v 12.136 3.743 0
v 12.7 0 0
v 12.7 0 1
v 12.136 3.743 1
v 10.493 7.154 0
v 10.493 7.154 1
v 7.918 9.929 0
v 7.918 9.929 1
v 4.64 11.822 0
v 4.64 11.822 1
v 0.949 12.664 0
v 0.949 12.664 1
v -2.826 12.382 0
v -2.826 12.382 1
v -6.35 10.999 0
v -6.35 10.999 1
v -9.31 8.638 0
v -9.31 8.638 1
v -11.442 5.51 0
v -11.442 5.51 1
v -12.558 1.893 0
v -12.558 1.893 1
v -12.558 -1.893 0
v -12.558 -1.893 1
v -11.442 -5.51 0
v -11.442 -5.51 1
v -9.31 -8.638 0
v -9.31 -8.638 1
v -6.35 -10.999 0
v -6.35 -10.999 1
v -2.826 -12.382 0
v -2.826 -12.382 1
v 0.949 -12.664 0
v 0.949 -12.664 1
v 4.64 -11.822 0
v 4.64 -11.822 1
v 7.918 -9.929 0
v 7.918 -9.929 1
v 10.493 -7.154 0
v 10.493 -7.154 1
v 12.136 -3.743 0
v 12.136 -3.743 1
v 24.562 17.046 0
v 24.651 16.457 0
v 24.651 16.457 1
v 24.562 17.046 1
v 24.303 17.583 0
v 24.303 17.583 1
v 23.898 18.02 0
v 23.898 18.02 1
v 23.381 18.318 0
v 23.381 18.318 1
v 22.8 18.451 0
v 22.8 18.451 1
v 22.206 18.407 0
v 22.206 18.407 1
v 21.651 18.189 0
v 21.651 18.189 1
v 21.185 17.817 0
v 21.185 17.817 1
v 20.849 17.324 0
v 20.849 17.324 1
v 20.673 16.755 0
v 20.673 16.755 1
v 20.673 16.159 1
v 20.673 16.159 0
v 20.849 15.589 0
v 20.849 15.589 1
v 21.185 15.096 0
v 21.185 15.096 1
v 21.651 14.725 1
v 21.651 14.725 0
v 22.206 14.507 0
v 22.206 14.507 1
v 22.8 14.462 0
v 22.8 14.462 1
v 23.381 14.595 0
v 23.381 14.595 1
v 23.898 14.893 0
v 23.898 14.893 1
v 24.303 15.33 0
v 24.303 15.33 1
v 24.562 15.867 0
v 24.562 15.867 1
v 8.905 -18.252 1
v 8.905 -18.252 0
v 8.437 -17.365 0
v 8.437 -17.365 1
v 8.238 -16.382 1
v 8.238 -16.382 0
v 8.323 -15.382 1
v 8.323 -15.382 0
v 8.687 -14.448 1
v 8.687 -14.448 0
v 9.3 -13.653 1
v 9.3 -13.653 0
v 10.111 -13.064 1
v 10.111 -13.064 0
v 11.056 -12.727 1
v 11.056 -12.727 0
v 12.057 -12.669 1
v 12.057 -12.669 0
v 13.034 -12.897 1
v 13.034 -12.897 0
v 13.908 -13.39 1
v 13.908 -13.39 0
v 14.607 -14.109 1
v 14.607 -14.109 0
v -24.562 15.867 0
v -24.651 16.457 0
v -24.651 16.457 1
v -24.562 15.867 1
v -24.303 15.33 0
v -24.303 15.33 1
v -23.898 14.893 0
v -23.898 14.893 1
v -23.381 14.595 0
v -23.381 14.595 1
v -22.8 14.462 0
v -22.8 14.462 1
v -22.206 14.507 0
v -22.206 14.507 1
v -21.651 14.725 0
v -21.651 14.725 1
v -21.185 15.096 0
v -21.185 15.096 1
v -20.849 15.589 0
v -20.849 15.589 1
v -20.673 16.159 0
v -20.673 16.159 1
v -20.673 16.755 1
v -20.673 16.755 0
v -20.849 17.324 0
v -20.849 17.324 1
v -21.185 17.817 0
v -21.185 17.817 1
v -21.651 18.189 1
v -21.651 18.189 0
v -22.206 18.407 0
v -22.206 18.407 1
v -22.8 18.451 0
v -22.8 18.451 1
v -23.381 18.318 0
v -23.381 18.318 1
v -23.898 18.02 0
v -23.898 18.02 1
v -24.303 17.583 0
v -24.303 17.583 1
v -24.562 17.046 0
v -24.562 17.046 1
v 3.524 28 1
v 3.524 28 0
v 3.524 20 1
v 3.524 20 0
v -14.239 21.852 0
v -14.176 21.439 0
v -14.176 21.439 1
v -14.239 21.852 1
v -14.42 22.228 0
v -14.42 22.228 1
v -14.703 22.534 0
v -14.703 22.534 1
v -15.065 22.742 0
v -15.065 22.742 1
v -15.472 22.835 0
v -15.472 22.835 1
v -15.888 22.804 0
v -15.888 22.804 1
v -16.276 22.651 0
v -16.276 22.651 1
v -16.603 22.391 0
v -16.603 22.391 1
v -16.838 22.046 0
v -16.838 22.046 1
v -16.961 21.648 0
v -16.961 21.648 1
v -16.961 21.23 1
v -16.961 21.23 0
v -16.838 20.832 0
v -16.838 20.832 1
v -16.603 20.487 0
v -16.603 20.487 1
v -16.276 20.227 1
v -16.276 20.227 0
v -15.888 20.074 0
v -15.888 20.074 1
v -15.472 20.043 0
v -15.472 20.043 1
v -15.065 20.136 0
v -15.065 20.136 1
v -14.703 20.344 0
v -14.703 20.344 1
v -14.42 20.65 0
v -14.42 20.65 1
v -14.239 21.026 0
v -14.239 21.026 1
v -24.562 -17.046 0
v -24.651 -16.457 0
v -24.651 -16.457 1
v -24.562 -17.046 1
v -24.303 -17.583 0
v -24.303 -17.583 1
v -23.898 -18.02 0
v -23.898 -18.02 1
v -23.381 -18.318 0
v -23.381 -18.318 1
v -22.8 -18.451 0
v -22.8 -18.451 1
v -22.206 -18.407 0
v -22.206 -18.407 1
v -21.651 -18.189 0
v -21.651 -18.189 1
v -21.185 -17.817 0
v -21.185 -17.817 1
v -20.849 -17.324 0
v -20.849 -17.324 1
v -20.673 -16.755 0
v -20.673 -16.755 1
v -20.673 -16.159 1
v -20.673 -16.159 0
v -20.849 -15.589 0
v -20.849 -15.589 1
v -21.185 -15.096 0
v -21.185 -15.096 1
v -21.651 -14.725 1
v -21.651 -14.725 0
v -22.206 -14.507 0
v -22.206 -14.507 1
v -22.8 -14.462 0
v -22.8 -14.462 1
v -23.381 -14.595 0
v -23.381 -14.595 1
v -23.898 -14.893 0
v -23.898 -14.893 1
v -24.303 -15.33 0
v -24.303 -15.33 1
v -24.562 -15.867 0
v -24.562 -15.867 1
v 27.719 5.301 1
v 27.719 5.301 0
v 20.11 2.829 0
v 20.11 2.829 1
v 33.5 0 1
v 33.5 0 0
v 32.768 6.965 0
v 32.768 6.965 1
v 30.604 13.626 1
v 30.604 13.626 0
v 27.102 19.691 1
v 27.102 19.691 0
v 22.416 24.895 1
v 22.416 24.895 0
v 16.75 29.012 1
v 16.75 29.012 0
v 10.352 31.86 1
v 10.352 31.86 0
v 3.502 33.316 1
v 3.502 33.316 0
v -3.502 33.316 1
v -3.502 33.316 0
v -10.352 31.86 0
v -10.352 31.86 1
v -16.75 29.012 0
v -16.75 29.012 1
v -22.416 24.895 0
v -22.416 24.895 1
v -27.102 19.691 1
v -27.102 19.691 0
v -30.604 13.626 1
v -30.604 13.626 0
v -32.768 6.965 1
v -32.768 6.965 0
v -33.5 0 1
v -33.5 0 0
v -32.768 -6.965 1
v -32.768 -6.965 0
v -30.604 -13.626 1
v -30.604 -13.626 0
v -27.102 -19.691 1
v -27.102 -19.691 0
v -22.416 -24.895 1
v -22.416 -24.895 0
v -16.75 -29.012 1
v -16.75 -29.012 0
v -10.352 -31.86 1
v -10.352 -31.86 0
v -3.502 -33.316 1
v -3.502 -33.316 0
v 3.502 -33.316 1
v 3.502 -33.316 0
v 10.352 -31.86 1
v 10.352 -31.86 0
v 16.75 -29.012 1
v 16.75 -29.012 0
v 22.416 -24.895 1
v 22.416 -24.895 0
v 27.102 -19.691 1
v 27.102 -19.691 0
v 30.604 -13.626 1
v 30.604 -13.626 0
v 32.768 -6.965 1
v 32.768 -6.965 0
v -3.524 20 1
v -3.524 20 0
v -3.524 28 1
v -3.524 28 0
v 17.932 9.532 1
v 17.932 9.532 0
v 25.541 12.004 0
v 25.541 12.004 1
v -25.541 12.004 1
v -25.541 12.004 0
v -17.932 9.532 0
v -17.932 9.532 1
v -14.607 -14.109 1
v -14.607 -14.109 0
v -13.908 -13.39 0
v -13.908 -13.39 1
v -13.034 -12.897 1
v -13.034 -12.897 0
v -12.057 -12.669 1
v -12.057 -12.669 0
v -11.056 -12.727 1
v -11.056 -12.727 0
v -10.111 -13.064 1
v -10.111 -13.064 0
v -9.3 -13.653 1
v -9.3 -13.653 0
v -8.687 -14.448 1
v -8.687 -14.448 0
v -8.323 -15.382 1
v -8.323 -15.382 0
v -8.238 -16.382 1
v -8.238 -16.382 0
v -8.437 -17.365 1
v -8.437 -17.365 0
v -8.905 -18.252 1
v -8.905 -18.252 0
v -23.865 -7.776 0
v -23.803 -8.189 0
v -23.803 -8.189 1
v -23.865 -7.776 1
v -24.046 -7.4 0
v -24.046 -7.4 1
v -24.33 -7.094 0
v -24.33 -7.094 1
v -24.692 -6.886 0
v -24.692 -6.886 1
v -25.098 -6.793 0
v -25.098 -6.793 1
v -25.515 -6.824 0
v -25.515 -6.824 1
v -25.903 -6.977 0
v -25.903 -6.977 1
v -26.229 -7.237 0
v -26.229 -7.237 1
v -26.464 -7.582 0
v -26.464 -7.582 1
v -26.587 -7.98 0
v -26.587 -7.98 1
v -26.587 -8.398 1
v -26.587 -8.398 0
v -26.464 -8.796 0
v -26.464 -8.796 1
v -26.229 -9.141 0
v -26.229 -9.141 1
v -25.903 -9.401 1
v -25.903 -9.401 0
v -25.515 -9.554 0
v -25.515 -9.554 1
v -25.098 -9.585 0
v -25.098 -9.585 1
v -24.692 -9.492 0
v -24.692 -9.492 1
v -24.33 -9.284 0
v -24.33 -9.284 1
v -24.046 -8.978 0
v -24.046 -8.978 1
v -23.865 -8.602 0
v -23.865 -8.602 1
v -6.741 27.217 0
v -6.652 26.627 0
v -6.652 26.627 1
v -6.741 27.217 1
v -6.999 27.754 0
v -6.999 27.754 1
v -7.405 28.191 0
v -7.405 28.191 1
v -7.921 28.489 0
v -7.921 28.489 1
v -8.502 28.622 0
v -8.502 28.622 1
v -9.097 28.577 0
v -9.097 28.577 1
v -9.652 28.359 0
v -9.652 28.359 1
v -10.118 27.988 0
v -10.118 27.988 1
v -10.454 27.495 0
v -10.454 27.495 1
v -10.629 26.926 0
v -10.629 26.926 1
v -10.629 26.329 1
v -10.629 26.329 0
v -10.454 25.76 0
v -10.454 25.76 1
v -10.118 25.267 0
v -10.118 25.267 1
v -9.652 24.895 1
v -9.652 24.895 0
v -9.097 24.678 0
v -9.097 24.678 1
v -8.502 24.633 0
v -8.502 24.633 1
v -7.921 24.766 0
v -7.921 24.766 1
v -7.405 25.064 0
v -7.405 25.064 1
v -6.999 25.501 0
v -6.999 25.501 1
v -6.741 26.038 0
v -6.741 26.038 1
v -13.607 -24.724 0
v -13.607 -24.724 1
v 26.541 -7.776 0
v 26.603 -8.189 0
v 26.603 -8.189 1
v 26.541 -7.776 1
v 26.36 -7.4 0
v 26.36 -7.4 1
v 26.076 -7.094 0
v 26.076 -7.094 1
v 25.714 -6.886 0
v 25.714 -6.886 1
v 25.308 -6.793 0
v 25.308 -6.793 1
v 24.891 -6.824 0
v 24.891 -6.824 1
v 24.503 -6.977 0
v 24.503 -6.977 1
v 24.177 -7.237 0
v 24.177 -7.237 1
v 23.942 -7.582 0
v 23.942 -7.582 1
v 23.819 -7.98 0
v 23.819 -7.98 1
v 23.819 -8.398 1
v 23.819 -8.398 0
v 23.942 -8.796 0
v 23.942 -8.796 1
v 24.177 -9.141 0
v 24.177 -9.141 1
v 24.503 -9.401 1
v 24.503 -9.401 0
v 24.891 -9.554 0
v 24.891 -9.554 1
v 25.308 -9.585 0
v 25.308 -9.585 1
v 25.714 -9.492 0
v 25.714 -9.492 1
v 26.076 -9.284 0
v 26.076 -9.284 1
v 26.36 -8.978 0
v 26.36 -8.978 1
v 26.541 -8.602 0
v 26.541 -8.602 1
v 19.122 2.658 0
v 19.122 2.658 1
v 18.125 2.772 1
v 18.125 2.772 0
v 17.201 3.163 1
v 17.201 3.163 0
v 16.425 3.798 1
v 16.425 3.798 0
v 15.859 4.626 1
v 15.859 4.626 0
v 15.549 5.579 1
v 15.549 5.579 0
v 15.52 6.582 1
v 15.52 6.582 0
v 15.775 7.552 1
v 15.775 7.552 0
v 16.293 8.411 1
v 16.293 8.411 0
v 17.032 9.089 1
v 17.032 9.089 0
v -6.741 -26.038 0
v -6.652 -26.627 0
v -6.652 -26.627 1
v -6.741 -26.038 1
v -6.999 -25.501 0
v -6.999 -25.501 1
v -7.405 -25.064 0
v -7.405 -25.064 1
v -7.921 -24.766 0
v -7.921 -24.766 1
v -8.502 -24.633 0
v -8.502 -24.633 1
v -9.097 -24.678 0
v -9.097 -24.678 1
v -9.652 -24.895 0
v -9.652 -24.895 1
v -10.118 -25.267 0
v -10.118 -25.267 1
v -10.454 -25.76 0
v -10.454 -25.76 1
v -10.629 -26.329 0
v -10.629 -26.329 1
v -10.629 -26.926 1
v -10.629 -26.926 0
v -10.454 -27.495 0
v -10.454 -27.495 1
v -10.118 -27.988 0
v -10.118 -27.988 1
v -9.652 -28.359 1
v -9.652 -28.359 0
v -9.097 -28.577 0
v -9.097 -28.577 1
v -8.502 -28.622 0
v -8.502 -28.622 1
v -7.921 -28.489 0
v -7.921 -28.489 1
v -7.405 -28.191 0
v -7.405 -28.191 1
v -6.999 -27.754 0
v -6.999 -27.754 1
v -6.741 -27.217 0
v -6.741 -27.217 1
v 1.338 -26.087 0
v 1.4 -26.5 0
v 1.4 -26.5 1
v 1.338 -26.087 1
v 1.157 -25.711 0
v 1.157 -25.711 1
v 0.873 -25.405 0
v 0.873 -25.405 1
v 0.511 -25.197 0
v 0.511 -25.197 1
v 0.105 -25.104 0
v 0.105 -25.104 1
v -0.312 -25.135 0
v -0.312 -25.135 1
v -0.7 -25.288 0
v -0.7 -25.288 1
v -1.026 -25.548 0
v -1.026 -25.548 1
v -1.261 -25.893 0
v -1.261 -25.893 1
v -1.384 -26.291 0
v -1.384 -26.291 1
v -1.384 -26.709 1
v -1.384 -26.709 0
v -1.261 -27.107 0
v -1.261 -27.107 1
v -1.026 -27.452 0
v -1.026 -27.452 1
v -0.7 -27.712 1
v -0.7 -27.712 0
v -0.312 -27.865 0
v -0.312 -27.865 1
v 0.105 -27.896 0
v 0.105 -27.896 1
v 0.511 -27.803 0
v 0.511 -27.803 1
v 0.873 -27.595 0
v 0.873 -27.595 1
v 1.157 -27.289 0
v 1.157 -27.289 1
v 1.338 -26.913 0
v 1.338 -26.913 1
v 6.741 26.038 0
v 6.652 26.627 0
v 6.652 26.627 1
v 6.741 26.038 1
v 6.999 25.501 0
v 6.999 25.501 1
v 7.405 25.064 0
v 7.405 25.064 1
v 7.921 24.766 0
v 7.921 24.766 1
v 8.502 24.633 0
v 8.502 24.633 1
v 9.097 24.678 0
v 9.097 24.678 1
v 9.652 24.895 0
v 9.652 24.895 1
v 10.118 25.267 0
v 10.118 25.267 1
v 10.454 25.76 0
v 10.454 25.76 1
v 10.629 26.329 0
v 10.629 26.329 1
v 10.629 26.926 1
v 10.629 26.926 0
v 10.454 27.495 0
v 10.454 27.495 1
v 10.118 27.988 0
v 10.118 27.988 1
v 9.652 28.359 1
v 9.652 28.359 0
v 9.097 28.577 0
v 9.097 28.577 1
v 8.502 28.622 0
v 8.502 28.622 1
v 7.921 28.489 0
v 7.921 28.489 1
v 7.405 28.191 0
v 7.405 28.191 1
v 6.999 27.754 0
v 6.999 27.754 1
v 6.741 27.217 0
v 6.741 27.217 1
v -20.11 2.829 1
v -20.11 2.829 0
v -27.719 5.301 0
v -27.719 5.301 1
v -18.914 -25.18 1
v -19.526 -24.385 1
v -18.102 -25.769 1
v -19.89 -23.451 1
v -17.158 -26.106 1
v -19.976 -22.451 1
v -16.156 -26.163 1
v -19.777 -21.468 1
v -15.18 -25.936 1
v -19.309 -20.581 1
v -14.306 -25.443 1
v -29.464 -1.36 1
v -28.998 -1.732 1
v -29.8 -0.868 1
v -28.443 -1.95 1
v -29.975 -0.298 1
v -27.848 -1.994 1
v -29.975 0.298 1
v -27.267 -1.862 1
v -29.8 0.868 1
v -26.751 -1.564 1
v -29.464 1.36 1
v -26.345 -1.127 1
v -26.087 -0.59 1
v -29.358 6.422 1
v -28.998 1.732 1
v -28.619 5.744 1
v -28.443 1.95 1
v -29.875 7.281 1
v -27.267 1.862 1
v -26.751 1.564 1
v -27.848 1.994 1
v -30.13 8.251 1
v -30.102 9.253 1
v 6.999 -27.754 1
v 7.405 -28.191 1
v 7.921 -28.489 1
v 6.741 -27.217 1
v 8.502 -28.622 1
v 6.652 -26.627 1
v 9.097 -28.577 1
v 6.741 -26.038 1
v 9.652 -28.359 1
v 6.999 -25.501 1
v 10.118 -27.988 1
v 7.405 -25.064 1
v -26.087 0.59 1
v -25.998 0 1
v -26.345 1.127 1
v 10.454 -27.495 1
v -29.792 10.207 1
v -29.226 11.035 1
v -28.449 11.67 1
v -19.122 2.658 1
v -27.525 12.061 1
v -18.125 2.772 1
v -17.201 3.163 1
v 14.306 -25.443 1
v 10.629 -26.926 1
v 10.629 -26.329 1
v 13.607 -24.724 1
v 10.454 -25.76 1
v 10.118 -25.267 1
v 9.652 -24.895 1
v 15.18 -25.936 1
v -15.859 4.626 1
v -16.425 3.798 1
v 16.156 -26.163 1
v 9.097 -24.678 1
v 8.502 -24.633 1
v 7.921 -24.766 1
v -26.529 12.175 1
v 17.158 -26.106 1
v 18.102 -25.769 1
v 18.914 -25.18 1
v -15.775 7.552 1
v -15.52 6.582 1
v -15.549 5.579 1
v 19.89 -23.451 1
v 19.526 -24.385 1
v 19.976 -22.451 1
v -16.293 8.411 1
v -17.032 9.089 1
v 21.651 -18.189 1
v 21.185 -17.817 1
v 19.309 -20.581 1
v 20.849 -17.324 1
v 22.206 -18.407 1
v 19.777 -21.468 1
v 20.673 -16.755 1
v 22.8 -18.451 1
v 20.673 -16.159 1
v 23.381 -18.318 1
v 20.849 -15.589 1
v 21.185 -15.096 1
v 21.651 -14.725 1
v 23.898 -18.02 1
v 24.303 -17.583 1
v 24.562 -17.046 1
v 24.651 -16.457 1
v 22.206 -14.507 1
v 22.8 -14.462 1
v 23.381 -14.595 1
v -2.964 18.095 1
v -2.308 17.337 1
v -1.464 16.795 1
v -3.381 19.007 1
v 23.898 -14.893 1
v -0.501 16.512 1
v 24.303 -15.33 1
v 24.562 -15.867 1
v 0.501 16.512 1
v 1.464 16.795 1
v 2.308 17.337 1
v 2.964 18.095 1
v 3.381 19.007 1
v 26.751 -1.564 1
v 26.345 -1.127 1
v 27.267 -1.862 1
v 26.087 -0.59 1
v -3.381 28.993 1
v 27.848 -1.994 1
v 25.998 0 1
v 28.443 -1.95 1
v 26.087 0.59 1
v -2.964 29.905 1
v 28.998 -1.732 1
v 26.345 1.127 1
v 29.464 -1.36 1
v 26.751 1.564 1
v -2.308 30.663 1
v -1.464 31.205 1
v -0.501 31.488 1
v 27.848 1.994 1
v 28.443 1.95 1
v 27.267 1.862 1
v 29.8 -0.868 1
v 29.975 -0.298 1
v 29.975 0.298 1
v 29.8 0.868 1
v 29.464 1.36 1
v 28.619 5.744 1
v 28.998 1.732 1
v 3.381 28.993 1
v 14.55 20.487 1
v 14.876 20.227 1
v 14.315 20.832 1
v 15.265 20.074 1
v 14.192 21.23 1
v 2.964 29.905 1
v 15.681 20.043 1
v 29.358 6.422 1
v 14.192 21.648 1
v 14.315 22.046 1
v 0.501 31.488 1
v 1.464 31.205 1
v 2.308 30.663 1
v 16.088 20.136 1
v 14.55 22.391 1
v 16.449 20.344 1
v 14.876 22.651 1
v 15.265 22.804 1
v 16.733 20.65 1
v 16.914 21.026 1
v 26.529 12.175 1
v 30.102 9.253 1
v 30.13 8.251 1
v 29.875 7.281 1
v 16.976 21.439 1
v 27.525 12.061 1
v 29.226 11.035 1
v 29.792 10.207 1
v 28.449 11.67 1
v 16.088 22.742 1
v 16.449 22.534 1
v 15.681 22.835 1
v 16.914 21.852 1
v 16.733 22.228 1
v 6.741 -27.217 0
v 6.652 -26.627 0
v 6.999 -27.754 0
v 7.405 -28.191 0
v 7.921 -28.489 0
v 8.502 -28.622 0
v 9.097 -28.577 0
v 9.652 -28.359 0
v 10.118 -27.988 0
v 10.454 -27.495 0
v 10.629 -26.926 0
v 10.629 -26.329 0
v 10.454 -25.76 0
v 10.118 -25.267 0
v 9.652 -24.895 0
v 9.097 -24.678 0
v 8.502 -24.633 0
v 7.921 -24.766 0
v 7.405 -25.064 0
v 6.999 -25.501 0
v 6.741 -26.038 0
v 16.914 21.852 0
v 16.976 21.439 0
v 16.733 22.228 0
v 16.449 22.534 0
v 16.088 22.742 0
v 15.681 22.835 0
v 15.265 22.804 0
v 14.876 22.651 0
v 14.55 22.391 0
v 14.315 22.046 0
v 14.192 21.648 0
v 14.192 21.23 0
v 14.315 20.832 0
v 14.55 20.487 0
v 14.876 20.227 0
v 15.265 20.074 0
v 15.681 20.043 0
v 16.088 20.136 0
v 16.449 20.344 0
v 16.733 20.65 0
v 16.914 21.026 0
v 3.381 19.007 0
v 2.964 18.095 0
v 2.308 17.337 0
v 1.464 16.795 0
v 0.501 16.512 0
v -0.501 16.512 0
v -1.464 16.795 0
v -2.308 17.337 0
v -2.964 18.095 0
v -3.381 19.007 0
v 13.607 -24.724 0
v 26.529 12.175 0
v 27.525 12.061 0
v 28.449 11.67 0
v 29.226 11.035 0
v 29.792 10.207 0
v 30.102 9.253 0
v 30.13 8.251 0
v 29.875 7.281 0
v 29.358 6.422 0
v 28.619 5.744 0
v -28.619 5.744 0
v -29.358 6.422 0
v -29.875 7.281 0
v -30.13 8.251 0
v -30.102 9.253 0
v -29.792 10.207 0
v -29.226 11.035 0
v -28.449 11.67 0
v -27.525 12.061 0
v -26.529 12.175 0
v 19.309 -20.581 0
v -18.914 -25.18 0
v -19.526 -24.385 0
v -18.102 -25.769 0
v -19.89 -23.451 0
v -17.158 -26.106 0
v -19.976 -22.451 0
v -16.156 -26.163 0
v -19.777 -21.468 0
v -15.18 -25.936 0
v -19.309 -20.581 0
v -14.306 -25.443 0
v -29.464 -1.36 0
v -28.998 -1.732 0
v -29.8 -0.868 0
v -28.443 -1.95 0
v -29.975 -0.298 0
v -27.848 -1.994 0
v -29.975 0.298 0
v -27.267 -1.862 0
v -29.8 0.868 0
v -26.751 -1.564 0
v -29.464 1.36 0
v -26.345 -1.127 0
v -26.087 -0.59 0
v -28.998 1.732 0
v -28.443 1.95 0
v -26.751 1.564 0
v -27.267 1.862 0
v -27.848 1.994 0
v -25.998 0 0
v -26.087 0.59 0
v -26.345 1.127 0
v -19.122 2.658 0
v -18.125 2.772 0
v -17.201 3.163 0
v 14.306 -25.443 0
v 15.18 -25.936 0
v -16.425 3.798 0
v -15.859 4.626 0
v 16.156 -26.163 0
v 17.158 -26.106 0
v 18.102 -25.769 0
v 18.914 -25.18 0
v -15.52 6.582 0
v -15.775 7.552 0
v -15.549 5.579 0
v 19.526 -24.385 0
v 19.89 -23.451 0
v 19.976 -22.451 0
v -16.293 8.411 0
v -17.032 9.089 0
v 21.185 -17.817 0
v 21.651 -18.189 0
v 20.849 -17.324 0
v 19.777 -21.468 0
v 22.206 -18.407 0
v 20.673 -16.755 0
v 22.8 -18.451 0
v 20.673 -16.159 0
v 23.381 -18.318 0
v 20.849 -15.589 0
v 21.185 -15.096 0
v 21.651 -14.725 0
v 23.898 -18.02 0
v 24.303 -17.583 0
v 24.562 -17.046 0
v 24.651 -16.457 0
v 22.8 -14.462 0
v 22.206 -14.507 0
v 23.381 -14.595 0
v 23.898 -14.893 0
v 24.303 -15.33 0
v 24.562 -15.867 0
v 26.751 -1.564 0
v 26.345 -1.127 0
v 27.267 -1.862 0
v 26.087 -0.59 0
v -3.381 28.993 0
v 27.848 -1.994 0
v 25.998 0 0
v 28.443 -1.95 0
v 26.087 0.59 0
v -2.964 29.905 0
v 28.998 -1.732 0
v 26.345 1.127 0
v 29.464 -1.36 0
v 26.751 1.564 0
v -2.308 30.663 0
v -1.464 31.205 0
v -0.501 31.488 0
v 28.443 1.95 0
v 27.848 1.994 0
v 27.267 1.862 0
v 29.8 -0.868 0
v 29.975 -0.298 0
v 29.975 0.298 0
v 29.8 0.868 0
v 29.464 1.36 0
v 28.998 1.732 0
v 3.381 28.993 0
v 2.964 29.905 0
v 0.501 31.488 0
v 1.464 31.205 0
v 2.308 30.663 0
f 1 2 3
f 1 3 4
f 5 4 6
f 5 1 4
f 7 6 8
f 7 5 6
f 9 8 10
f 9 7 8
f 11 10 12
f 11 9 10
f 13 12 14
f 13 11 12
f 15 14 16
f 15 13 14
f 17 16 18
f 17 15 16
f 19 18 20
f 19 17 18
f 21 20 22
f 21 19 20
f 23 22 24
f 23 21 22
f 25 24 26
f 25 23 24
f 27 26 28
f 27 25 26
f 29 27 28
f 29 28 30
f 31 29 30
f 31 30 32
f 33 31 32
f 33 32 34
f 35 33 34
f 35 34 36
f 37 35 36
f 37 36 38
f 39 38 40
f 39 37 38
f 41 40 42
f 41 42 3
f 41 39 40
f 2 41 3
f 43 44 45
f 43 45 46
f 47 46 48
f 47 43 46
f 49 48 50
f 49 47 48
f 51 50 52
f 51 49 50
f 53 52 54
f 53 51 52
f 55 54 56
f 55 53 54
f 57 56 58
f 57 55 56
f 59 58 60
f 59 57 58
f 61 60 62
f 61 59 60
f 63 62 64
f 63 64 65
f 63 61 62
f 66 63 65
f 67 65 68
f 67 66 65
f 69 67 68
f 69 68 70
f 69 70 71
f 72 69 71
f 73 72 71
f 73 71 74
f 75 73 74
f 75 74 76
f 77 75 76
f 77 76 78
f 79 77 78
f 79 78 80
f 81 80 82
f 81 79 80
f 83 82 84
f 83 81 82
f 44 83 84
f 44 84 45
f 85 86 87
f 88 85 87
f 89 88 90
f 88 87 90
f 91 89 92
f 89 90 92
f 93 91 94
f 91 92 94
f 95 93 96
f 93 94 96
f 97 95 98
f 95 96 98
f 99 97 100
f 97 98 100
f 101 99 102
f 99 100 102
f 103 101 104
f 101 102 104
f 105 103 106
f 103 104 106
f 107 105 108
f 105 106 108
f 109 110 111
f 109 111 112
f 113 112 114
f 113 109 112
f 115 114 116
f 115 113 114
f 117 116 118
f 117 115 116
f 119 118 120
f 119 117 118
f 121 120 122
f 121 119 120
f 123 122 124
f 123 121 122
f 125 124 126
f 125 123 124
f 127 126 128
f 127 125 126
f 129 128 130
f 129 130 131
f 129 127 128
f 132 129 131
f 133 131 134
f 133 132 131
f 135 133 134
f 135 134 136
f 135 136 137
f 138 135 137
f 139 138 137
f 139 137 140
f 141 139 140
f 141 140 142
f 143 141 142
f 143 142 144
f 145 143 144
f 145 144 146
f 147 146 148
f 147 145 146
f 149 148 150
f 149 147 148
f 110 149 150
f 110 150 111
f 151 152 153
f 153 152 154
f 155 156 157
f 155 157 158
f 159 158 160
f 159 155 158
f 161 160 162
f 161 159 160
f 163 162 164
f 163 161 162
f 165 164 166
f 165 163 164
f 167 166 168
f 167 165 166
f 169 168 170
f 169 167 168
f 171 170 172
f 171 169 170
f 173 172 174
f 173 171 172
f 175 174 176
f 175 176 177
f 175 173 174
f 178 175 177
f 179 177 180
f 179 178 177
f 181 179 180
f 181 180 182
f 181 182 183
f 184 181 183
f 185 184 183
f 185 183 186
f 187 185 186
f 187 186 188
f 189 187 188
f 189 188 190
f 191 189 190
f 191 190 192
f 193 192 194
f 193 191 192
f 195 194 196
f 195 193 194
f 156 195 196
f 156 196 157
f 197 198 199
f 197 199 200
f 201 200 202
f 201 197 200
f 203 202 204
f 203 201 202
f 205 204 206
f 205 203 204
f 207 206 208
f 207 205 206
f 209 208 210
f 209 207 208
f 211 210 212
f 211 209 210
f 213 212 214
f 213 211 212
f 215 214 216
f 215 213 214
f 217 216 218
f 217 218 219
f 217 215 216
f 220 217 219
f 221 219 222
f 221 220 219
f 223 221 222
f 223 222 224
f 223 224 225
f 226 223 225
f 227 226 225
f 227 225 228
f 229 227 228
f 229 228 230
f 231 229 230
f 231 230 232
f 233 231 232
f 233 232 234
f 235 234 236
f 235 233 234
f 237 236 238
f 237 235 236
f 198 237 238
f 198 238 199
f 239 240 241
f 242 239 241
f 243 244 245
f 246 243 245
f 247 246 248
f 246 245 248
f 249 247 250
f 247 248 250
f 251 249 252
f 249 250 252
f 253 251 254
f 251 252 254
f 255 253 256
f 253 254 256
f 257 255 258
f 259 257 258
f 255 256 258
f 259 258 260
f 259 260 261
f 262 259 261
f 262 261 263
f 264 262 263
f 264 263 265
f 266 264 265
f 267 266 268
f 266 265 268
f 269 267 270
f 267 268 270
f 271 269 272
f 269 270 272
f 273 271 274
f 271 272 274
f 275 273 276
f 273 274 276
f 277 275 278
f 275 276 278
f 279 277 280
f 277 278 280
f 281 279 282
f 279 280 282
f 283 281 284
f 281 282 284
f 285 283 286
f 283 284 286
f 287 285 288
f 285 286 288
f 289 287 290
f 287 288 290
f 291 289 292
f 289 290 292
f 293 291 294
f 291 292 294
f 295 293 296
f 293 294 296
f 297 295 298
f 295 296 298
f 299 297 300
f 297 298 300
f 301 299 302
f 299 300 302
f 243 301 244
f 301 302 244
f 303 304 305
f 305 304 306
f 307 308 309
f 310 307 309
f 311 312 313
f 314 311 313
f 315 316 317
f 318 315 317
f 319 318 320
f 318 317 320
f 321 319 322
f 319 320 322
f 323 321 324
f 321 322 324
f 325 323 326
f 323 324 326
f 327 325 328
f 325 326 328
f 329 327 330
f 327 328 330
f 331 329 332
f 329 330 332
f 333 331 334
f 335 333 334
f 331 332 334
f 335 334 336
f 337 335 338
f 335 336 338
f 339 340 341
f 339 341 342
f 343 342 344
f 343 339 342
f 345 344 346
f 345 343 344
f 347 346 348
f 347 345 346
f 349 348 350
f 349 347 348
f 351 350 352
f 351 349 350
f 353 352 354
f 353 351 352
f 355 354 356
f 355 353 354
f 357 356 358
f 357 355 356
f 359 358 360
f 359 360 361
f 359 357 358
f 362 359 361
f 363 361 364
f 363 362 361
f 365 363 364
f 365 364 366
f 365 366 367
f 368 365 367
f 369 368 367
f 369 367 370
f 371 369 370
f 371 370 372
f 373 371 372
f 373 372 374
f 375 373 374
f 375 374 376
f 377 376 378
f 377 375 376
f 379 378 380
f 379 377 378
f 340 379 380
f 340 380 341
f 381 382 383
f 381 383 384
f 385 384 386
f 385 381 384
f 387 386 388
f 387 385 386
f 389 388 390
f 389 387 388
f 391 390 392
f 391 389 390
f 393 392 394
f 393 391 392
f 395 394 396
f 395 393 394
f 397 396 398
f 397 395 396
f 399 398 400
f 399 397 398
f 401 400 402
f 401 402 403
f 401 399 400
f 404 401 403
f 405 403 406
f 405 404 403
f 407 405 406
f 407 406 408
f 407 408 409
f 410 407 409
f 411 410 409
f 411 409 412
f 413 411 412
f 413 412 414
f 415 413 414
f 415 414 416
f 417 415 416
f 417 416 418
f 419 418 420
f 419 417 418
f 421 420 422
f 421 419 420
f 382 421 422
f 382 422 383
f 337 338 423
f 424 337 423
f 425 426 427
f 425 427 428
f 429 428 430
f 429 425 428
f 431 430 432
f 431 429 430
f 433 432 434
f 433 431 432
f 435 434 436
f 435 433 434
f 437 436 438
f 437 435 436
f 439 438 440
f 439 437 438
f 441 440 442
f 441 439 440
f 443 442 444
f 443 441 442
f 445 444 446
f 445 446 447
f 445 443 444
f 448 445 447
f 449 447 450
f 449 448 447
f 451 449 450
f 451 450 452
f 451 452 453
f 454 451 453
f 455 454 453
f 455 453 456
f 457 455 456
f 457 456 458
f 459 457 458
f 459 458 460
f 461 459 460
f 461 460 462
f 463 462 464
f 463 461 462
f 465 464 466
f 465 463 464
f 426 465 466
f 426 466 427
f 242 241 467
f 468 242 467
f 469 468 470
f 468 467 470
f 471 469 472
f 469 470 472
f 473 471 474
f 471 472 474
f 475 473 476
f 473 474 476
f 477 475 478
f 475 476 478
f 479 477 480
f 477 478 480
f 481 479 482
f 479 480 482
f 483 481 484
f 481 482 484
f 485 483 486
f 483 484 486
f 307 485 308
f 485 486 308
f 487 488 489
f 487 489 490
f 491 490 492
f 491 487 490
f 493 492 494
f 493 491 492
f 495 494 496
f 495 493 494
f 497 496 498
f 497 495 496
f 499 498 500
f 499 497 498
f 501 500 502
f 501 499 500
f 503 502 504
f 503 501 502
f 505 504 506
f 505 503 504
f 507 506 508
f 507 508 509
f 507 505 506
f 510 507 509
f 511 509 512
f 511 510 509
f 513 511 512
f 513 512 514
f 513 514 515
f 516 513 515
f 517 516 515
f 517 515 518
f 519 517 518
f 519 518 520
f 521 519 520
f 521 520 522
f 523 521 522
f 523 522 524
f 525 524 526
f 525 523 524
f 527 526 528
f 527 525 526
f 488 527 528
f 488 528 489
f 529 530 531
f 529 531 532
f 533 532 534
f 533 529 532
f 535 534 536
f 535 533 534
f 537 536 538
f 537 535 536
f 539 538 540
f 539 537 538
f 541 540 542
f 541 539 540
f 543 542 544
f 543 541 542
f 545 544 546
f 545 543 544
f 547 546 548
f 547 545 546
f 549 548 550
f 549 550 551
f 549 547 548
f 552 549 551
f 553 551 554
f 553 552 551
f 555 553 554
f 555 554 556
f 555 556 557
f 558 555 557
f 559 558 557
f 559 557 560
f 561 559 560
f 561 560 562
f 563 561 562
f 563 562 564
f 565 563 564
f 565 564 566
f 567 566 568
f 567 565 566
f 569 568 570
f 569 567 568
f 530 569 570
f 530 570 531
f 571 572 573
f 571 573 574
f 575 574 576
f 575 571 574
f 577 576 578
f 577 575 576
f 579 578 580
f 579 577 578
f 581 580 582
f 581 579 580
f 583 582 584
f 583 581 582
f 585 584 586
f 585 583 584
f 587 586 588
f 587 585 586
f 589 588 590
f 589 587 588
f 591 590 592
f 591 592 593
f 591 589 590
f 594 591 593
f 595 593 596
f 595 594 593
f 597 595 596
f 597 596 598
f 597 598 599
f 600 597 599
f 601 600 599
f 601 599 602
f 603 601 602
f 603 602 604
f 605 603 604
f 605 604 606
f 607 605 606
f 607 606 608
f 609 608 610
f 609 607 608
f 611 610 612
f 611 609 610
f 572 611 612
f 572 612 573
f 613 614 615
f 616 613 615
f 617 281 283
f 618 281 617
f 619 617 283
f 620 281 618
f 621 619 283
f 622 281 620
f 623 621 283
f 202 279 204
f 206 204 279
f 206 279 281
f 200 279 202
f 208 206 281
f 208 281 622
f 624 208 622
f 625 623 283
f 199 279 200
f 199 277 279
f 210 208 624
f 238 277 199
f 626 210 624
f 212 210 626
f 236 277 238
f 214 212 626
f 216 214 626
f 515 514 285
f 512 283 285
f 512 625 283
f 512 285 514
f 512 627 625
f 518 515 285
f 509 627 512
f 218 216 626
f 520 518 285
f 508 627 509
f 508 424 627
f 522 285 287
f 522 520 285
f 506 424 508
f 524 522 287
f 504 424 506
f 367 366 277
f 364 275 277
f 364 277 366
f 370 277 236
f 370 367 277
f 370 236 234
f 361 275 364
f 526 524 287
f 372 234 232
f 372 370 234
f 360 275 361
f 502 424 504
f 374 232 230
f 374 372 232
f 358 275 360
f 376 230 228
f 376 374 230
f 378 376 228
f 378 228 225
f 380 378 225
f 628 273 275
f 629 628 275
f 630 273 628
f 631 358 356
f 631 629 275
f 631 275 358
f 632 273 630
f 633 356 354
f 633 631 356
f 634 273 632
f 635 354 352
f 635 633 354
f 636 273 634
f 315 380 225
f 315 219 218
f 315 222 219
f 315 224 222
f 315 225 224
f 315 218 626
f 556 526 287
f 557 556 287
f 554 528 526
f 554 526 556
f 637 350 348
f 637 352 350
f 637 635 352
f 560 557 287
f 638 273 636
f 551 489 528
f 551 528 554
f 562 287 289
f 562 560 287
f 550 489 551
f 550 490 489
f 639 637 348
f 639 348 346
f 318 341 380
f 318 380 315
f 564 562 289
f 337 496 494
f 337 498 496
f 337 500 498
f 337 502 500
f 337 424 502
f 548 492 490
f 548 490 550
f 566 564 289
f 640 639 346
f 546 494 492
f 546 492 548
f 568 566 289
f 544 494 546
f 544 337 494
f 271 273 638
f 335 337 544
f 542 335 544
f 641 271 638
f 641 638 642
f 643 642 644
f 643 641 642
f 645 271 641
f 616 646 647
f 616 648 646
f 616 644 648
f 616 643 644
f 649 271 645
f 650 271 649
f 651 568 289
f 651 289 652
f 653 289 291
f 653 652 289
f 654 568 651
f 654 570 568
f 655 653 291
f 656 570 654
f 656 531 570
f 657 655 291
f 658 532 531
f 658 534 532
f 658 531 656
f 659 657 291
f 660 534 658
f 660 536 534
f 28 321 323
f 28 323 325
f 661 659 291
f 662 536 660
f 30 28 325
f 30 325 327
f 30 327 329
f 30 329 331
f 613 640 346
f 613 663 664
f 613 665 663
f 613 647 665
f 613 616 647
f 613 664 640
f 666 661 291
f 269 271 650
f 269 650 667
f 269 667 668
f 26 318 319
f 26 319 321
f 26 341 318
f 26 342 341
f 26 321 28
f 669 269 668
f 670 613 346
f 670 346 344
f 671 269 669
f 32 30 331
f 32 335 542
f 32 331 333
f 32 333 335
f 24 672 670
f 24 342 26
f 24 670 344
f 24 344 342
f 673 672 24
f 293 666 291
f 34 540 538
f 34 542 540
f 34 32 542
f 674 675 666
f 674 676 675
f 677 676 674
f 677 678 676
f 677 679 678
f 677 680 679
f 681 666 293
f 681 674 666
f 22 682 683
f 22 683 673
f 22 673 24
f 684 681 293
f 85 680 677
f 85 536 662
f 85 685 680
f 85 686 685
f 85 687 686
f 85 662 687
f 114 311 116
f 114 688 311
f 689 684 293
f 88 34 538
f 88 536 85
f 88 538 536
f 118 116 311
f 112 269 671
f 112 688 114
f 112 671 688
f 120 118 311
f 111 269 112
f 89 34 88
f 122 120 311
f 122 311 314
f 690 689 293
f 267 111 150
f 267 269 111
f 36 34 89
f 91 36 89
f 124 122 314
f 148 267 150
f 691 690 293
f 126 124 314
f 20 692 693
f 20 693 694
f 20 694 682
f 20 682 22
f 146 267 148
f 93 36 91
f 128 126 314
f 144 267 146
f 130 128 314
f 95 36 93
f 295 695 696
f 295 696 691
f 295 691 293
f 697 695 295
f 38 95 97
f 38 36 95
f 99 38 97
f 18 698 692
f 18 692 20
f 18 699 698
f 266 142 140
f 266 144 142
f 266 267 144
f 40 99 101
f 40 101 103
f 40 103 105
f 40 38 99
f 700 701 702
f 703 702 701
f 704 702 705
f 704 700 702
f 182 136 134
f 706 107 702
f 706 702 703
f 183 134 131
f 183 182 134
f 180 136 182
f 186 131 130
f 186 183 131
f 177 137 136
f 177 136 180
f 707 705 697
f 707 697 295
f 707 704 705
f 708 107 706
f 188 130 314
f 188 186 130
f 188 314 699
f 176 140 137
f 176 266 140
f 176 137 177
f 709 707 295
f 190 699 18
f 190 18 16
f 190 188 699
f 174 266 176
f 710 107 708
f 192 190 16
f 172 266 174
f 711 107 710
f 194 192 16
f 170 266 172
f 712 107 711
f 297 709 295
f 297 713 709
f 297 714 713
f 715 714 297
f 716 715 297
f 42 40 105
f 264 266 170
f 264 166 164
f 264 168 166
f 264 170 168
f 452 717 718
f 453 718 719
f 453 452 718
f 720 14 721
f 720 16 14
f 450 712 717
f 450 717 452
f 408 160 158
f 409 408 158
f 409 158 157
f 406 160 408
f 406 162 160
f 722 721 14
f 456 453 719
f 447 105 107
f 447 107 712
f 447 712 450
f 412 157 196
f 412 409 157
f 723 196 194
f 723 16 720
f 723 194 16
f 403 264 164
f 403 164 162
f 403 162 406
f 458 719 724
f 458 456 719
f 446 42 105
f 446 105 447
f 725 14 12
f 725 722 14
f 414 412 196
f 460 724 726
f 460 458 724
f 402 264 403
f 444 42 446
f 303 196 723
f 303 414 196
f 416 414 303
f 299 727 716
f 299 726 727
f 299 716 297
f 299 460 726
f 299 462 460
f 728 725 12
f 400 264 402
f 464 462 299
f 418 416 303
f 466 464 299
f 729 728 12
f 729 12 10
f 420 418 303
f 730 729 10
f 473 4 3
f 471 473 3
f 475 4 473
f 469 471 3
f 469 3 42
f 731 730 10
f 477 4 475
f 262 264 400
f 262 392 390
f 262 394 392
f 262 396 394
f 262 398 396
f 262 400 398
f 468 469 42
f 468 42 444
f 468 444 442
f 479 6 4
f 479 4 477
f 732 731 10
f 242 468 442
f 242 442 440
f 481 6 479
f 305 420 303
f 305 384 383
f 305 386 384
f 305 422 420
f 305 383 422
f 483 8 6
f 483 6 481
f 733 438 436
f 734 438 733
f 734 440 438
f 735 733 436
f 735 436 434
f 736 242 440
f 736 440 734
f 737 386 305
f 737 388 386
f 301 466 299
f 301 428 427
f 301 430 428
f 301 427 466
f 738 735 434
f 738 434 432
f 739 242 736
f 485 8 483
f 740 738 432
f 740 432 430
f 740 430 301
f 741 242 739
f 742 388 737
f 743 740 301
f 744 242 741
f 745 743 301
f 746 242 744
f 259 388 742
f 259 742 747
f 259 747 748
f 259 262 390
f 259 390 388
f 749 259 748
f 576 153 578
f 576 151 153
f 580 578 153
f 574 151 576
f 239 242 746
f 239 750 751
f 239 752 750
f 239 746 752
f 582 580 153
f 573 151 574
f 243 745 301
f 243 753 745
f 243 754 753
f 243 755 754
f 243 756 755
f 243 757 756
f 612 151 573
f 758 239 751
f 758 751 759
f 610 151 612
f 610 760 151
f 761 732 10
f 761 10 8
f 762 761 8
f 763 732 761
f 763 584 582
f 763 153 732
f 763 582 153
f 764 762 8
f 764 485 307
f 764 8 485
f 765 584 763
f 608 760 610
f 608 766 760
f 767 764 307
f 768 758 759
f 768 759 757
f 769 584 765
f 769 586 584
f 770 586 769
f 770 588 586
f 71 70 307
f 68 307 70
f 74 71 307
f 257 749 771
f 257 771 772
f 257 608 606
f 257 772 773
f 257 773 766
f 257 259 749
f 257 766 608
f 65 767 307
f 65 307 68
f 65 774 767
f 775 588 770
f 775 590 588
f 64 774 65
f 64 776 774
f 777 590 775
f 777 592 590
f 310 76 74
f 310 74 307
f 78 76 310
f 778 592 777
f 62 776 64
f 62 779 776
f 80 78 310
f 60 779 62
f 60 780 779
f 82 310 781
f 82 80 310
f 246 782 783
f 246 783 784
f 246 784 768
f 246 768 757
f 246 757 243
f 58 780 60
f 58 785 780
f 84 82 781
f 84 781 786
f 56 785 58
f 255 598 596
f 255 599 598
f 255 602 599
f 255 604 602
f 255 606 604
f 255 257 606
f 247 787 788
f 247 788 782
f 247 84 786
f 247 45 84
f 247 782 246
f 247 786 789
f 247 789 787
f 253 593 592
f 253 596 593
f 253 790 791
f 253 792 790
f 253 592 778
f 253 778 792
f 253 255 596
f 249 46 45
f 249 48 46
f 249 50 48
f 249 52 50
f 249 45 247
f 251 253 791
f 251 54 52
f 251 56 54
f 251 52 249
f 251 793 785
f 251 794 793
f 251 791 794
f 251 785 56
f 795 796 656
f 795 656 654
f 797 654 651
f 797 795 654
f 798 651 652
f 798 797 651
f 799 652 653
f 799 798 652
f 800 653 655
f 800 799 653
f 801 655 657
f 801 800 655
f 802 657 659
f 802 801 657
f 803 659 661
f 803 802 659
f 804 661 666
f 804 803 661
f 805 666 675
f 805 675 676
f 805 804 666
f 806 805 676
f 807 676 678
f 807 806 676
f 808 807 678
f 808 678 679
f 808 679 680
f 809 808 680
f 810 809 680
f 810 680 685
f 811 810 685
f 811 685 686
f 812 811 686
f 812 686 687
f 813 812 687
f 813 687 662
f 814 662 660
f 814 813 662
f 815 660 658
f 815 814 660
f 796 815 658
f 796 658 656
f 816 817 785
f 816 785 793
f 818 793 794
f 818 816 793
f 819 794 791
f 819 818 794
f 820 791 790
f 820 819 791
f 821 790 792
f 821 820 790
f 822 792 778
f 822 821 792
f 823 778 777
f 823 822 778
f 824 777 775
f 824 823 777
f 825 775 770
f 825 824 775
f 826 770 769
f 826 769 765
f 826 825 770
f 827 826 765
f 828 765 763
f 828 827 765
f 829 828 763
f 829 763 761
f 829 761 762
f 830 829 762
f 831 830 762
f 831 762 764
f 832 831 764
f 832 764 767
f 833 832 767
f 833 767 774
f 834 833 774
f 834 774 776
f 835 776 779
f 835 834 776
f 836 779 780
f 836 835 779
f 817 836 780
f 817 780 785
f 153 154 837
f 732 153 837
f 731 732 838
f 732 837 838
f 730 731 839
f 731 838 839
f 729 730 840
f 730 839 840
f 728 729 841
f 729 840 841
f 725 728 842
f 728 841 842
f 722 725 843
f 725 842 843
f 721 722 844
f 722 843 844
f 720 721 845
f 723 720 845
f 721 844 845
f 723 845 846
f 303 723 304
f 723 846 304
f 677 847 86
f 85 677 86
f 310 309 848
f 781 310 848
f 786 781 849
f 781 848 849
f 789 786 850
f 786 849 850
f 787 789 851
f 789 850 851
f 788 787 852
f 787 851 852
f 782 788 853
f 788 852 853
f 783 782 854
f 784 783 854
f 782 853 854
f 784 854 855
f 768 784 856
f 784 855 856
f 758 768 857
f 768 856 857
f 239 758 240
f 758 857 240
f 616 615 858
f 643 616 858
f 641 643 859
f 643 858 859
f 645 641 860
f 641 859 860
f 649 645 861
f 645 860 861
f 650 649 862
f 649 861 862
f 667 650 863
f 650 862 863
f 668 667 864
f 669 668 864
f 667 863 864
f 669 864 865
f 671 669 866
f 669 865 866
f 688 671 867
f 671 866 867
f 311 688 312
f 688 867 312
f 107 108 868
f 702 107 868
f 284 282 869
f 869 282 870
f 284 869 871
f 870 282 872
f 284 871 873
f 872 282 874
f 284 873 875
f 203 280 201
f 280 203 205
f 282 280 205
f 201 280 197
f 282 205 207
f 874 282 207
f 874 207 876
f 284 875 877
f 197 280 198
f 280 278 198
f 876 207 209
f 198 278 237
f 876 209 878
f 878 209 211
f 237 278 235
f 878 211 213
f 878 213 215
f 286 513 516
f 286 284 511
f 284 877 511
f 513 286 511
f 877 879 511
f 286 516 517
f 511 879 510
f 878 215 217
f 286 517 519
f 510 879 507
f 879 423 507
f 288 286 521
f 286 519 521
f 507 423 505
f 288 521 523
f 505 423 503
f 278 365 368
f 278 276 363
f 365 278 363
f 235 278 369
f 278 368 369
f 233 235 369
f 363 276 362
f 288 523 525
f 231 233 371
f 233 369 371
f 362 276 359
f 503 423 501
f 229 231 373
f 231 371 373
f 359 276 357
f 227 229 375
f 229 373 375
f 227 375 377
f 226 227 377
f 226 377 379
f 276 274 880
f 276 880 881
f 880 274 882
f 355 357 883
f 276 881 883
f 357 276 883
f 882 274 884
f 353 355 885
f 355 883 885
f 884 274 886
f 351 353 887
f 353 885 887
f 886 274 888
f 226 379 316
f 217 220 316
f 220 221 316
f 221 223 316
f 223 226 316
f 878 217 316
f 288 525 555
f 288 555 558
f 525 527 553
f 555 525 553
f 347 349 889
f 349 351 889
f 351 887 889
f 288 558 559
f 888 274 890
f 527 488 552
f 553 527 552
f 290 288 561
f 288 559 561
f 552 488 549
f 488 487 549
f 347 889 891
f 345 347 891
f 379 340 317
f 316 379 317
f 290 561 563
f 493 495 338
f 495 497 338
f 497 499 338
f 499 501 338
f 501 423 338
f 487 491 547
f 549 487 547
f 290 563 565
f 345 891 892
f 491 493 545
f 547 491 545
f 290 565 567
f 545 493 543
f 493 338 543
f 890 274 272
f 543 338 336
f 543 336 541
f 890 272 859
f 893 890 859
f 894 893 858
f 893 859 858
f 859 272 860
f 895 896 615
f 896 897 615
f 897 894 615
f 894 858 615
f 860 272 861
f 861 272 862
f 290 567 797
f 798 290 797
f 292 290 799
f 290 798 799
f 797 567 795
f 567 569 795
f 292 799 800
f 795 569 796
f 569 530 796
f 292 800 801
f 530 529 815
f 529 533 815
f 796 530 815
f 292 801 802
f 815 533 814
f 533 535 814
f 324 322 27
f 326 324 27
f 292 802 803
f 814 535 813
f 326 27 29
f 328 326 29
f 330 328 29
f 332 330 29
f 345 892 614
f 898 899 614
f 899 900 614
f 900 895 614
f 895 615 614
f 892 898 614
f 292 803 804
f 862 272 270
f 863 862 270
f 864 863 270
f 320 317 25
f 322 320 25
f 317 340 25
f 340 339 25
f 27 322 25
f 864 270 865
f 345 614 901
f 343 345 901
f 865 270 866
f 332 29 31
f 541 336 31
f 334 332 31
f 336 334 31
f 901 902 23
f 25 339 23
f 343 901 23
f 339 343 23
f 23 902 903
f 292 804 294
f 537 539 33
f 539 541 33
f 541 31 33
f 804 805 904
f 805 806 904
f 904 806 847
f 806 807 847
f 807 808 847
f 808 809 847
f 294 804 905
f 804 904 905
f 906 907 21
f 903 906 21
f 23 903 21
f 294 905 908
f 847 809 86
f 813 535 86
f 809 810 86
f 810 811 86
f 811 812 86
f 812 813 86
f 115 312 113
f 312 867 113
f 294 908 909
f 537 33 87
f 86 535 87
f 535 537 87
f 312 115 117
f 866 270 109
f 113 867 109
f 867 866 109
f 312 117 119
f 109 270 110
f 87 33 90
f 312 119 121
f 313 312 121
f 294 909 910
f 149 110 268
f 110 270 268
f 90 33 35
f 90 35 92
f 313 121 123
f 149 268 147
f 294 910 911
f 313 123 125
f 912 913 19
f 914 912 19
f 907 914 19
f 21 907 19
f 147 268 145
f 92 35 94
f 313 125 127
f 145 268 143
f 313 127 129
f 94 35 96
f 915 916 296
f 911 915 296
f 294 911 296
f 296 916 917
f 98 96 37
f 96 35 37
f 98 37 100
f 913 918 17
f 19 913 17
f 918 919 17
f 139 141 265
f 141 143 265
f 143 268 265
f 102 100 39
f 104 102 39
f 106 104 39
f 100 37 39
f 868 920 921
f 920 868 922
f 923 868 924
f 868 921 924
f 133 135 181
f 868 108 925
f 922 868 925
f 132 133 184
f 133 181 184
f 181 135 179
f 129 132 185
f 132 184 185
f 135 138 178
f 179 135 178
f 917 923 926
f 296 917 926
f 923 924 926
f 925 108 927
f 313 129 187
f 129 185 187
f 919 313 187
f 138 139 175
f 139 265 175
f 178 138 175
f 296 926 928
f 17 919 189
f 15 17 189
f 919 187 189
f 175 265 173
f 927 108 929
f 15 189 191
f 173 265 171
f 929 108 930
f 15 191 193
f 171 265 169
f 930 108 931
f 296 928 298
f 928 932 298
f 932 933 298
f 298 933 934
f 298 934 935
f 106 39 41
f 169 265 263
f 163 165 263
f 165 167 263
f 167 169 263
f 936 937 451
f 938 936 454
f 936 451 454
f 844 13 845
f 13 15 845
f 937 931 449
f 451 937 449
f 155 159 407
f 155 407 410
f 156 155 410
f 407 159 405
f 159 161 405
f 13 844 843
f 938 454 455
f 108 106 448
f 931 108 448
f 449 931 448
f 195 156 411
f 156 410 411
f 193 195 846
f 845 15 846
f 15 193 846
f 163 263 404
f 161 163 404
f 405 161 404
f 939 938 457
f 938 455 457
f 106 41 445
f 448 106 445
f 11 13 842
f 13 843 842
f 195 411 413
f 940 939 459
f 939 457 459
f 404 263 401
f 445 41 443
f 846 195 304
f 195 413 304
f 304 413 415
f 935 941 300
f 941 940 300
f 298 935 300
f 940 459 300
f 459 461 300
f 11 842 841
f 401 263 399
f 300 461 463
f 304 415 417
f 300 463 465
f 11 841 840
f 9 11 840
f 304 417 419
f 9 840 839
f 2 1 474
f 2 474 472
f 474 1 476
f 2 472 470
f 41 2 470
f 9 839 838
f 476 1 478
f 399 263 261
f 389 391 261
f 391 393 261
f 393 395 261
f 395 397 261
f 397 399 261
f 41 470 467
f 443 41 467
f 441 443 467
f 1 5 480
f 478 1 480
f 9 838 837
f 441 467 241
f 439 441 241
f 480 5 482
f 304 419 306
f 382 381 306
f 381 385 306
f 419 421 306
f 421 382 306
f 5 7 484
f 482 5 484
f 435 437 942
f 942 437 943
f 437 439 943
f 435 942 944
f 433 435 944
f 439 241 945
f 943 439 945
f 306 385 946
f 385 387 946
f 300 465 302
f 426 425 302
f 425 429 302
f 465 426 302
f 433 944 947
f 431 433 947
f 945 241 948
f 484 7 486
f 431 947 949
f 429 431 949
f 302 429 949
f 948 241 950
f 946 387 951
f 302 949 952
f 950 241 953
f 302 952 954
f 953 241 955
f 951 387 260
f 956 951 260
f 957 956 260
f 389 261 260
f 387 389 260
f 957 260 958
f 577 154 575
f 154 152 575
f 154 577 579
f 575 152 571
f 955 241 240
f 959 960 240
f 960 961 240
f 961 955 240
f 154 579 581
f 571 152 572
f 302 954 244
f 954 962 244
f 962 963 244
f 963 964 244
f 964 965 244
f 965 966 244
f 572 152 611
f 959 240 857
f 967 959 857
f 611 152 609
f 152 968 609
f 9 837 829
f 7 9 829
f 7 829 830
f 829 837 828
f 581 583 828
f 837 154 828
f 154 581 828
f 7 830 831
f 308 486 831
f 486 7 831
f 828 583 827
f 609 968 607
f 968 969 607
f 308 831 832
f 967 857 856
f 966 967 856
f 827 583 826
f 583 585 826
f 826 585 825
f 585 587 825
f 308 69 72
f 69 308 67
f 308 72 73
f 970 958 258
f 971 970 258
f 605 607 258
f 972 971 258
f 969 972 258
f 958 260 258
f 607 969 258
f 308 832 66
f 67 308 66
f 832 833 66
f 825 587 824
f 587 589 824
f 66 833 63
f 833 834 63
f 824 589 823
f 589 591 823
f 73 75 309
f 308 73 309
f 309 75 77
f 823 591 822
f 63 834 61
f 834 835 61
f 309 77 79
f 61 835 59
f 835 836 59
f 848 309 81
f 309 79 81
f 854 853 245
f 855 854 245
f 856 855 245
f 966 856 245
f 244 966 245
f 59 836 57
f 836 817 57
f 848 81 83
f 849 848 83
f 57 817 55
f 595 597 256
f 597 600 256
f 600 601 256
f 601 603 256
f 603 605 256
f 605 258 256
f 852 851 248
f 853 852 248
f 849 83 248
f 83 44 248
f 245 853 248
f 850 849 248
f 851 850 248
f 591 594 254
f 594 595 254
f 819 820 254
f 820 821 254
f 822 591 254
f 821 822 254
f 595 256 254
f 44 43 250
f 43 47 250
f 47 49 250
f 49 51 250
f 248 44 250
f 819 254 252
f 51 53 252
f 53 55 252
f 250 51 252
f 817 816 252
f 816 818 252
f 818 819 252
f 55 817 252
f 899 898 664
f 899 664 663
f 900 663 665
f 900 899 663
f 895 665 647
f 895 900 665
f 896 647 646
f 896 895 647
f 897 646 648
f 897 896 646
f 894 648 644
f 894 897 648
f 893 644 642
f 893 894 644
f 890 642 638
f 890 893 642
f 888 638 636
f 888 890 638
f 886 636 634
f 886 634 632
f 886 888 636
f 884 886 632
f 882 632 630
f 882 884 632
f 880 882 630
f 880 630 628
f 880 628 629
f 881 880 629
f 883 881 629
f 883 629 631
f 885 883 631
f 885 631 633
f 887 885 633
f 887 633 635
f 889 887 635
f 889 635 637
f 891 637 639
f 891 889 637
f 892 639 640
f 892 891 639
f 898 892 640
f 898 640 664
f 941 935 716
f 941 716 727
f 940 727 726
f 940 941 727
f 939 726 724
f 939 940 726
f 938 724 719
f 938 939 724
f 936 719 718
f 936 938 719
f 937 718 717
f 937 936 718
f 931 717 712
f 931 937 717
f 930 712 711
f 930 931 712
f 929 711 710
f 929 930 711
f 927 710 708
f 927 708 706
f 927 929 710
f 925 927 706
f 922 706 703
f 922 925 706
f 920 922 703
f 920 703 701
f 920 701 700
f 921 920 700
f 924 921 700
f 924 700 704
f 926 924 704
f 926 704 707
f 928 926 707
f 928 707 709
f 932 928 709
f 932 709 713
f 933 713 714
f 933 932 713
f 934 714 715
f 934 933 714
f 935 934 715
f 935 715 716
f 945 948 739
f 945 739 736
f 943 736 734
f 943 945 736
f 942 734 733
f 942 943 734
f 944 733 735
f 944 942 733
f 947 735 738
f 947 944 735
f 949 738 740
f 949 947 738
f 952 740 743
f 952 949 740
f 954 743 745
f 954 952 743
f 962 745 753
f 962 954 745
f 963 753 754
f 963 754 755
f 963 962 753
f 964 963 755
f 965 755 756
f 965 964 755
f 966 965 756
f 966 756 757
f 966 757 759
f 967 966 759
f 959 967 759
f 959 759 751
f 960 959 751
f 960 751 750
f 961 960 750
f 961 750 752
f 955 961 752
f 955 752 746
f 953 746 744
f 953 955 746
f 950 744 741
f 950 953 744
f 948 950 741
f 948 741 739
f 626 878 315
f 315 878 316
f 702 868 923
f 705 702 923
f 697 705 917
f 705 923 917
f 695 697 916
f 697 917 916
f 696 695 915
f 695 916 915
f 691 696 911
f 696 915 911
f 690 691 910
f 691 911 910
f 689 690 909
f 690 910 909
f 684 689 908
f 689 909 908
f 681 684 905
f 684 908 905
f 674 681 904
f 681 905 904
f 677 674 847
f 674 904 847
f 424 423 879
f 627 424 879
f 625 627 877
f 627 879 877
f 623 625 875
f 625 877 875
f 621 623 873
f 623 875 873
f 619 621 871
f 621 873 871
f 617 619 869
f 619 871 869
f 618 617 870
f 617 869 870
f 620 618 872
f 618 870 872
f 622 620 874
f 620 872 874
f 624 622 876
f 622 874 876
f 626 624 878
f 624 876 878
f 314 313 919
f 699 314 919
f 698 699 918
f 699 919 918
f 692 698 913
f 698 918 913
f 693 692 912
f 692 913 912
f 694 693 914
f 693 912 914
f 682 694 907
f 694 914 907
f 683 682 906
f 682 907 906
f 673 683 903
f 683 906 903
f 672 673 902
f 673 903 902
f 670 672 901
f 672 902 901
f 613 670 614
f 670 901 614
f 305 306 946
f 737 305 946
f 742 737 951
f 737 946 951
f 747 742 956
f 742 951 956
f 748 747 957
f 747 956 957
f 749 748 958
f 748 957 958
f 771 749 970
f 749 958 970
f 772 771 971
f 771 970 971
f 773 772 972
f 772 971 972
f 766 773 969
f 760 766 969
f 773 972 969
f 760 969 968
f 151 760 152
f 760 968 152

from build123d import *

# Parameters (mm, degrees)
SKETCH_1_R      = 33.5
SKETCH_1_R_2    = 12.7
SKETCH_1_R_3    = 1.4
SKETCH_1_R_4    = 2
EXTRUDE_1_DEPTH = 1


with BuildPart() as part:
    # 草图1 → 凸台-拉伸1 (new body)
    with BuildSketch(Plane.XY):
        Circle(SKETCH_1_R)
        Circle(SKETCH_1_R_2, mode=Mode.SUBTRACT)
        with Locations((0, -26.5)):
            Circle(SKETCH_1_R_3, mode=Mode.SUBTRACT)
        with Locations((-25.202997682, -8.188950351)):
            Circle(SKETCH_1_R_3, mode=Mode.SUBTRACT)
        with Locations((-15.576309186, 21.438950351)):
            Circle(SKETCH_1_R_3, mode=Mode.SUBTRACT)
        with Locations((15.576309186, 21.438950351)):
            Circle(SKETCH_1_R_3, mode=Mode.SUBTRACT)
        with Locations((25.202997682, -8.188950351)):
            Circle(SKETCH_1_R_3, mode=Mode.SUBTRACT)
        with Locations((-8.651773631, -26.627421273)):
            Circle(SKETCH_1_R_4, mode=Mode.SUBTRACT)
        with Locations(Location((8.651773631, -26.627421273, 0), (0, 0, 180))):
            Circle(SKETCH_1_R_4, mode=Mode.SUBTRACT)
        with Locations((-27.997727597, 0)):
            Circle(SKETCH_1_R_4, mode=Mode.SUBTRACT)
        with Locations(Location((-22.65063743, -16.456651379, 0), (0, 0, 180))):
            Circle(SKETCH_1_R_4, mode=Mode.SUBTRACT)
        with Locations((-8.651773631, 26.627421273)):
            Circle(SKETCH_1_R_4, mode=Mode.SUBTRACT)
        with Locations(Location((-22.65063743, 16.456651379, 0), (0, 0, 180))):
            Circle(SKETCH_1_R_4, mode=Mode.SUBTRACT)
        with Locations((22.65063743, 16.456651379)):
            Circle(SKETCH_1_R_4, mode=Mode.SUBTRACT)
        with Locations(Location((8.651773631, 26.627421273, 0), (0, 0, 180))):
            Circle(SKETCH_1_R_4, mode=Mode.SUBTRACT)
        with Locations((22.65063743, -16.456651379)):
            Circle(SKETCH_1_R_4, mode=Mode.SUBTRACT)
        with Locations(Location((27.997727597, 0, 0), (0, 0, 180))):
            Circle(SKETCH_1_R_4, mode=Mode.SUBTRACT)
        with BuildLine():
            Line((-19.308819678, -20.581224709), (-14.606537659, -14.109088754))
            ThreePointArc((-14.606537659, -14.109088754), (-9.684453912, -13.329507274), (-8.904872432, -18.251591021))
            Line((-8.904872432, -18.251591021), (-13.607154451, -24.723726976))
            ThreePointArc((-13.607154451, -24.723726976), (-18.529238198, -25.503308456), (-19.308819678, -20.581224709))
        make_face(mode=Mode.SUBTRACT)
        with BuildLine():
            Line((-25.540661294, 12.003830576), (-17.932209164, 9.531694621))
            ThreePointArc((-17.932209164, 9.531694621), (-15.669775592, 5.091418725), (-20.110051488, 2.828985154))
            Line((-20.110051488, 2.828985154), (-27.718503618, 5.301121109))
            ThreePointArc((-27.718503618, 5.301121109), (-29.98093719, 9.741397005), (-25.540661294, 12.003830576))
        make_face(mode=Mode.SUBTRACT)
        with BuildLine():
            Line((3.523822903, 28), (3.523822903, 20))
            ThreePointArc((3.523822903, 20), (0, 16.476177097), (-3.523822903, 20))
            Line((-3.523822903, 20), (-3.523822903, 28))
            ThreePointArc((-3.523822903, 28), (0, 31.523822903), (3.523822903, 28))
        make_face(mode=Mode.SUBTRACT)
        with BuildLine():
            Line((27.718503618, 5.301121109), (20.110051488, 2.828985154))
            ThreePointArc((20.110051488, 2.828985154), (15.669775592, 5.091418725), (17.932209164, 9.531694621))
            Line((17.932209164, 9.531694621), (25.540661294, 12.003830576))
            ThreePointArc((25.540661294, 12.003830576), (29.98093719, 9.741397005), (27.718503618, 5.301121109))
        make_face(mode=Mode.SUBTRACT)
        with BuildLine():
            Line((13.607154451, -24.723726976), (8.904872432, -18.251591021))
            ThreePointArc((8.904872432, -18.251591021), (9.684453912, -13.329507274), (14.606537659, -14.109088754))
            Line((14.606537659, -14.109088754), (19.308819678, -20.581224709))
            ThreePointArc((19.308819678, -20.581224709), (18.529238198, -25.503308456), (13.607154451, -24.723726976))
        make_face(mode=Mode.SUBTRACT)
    extrude(amount=EXTRUDE_1_DEPTH)


solid = part.part
